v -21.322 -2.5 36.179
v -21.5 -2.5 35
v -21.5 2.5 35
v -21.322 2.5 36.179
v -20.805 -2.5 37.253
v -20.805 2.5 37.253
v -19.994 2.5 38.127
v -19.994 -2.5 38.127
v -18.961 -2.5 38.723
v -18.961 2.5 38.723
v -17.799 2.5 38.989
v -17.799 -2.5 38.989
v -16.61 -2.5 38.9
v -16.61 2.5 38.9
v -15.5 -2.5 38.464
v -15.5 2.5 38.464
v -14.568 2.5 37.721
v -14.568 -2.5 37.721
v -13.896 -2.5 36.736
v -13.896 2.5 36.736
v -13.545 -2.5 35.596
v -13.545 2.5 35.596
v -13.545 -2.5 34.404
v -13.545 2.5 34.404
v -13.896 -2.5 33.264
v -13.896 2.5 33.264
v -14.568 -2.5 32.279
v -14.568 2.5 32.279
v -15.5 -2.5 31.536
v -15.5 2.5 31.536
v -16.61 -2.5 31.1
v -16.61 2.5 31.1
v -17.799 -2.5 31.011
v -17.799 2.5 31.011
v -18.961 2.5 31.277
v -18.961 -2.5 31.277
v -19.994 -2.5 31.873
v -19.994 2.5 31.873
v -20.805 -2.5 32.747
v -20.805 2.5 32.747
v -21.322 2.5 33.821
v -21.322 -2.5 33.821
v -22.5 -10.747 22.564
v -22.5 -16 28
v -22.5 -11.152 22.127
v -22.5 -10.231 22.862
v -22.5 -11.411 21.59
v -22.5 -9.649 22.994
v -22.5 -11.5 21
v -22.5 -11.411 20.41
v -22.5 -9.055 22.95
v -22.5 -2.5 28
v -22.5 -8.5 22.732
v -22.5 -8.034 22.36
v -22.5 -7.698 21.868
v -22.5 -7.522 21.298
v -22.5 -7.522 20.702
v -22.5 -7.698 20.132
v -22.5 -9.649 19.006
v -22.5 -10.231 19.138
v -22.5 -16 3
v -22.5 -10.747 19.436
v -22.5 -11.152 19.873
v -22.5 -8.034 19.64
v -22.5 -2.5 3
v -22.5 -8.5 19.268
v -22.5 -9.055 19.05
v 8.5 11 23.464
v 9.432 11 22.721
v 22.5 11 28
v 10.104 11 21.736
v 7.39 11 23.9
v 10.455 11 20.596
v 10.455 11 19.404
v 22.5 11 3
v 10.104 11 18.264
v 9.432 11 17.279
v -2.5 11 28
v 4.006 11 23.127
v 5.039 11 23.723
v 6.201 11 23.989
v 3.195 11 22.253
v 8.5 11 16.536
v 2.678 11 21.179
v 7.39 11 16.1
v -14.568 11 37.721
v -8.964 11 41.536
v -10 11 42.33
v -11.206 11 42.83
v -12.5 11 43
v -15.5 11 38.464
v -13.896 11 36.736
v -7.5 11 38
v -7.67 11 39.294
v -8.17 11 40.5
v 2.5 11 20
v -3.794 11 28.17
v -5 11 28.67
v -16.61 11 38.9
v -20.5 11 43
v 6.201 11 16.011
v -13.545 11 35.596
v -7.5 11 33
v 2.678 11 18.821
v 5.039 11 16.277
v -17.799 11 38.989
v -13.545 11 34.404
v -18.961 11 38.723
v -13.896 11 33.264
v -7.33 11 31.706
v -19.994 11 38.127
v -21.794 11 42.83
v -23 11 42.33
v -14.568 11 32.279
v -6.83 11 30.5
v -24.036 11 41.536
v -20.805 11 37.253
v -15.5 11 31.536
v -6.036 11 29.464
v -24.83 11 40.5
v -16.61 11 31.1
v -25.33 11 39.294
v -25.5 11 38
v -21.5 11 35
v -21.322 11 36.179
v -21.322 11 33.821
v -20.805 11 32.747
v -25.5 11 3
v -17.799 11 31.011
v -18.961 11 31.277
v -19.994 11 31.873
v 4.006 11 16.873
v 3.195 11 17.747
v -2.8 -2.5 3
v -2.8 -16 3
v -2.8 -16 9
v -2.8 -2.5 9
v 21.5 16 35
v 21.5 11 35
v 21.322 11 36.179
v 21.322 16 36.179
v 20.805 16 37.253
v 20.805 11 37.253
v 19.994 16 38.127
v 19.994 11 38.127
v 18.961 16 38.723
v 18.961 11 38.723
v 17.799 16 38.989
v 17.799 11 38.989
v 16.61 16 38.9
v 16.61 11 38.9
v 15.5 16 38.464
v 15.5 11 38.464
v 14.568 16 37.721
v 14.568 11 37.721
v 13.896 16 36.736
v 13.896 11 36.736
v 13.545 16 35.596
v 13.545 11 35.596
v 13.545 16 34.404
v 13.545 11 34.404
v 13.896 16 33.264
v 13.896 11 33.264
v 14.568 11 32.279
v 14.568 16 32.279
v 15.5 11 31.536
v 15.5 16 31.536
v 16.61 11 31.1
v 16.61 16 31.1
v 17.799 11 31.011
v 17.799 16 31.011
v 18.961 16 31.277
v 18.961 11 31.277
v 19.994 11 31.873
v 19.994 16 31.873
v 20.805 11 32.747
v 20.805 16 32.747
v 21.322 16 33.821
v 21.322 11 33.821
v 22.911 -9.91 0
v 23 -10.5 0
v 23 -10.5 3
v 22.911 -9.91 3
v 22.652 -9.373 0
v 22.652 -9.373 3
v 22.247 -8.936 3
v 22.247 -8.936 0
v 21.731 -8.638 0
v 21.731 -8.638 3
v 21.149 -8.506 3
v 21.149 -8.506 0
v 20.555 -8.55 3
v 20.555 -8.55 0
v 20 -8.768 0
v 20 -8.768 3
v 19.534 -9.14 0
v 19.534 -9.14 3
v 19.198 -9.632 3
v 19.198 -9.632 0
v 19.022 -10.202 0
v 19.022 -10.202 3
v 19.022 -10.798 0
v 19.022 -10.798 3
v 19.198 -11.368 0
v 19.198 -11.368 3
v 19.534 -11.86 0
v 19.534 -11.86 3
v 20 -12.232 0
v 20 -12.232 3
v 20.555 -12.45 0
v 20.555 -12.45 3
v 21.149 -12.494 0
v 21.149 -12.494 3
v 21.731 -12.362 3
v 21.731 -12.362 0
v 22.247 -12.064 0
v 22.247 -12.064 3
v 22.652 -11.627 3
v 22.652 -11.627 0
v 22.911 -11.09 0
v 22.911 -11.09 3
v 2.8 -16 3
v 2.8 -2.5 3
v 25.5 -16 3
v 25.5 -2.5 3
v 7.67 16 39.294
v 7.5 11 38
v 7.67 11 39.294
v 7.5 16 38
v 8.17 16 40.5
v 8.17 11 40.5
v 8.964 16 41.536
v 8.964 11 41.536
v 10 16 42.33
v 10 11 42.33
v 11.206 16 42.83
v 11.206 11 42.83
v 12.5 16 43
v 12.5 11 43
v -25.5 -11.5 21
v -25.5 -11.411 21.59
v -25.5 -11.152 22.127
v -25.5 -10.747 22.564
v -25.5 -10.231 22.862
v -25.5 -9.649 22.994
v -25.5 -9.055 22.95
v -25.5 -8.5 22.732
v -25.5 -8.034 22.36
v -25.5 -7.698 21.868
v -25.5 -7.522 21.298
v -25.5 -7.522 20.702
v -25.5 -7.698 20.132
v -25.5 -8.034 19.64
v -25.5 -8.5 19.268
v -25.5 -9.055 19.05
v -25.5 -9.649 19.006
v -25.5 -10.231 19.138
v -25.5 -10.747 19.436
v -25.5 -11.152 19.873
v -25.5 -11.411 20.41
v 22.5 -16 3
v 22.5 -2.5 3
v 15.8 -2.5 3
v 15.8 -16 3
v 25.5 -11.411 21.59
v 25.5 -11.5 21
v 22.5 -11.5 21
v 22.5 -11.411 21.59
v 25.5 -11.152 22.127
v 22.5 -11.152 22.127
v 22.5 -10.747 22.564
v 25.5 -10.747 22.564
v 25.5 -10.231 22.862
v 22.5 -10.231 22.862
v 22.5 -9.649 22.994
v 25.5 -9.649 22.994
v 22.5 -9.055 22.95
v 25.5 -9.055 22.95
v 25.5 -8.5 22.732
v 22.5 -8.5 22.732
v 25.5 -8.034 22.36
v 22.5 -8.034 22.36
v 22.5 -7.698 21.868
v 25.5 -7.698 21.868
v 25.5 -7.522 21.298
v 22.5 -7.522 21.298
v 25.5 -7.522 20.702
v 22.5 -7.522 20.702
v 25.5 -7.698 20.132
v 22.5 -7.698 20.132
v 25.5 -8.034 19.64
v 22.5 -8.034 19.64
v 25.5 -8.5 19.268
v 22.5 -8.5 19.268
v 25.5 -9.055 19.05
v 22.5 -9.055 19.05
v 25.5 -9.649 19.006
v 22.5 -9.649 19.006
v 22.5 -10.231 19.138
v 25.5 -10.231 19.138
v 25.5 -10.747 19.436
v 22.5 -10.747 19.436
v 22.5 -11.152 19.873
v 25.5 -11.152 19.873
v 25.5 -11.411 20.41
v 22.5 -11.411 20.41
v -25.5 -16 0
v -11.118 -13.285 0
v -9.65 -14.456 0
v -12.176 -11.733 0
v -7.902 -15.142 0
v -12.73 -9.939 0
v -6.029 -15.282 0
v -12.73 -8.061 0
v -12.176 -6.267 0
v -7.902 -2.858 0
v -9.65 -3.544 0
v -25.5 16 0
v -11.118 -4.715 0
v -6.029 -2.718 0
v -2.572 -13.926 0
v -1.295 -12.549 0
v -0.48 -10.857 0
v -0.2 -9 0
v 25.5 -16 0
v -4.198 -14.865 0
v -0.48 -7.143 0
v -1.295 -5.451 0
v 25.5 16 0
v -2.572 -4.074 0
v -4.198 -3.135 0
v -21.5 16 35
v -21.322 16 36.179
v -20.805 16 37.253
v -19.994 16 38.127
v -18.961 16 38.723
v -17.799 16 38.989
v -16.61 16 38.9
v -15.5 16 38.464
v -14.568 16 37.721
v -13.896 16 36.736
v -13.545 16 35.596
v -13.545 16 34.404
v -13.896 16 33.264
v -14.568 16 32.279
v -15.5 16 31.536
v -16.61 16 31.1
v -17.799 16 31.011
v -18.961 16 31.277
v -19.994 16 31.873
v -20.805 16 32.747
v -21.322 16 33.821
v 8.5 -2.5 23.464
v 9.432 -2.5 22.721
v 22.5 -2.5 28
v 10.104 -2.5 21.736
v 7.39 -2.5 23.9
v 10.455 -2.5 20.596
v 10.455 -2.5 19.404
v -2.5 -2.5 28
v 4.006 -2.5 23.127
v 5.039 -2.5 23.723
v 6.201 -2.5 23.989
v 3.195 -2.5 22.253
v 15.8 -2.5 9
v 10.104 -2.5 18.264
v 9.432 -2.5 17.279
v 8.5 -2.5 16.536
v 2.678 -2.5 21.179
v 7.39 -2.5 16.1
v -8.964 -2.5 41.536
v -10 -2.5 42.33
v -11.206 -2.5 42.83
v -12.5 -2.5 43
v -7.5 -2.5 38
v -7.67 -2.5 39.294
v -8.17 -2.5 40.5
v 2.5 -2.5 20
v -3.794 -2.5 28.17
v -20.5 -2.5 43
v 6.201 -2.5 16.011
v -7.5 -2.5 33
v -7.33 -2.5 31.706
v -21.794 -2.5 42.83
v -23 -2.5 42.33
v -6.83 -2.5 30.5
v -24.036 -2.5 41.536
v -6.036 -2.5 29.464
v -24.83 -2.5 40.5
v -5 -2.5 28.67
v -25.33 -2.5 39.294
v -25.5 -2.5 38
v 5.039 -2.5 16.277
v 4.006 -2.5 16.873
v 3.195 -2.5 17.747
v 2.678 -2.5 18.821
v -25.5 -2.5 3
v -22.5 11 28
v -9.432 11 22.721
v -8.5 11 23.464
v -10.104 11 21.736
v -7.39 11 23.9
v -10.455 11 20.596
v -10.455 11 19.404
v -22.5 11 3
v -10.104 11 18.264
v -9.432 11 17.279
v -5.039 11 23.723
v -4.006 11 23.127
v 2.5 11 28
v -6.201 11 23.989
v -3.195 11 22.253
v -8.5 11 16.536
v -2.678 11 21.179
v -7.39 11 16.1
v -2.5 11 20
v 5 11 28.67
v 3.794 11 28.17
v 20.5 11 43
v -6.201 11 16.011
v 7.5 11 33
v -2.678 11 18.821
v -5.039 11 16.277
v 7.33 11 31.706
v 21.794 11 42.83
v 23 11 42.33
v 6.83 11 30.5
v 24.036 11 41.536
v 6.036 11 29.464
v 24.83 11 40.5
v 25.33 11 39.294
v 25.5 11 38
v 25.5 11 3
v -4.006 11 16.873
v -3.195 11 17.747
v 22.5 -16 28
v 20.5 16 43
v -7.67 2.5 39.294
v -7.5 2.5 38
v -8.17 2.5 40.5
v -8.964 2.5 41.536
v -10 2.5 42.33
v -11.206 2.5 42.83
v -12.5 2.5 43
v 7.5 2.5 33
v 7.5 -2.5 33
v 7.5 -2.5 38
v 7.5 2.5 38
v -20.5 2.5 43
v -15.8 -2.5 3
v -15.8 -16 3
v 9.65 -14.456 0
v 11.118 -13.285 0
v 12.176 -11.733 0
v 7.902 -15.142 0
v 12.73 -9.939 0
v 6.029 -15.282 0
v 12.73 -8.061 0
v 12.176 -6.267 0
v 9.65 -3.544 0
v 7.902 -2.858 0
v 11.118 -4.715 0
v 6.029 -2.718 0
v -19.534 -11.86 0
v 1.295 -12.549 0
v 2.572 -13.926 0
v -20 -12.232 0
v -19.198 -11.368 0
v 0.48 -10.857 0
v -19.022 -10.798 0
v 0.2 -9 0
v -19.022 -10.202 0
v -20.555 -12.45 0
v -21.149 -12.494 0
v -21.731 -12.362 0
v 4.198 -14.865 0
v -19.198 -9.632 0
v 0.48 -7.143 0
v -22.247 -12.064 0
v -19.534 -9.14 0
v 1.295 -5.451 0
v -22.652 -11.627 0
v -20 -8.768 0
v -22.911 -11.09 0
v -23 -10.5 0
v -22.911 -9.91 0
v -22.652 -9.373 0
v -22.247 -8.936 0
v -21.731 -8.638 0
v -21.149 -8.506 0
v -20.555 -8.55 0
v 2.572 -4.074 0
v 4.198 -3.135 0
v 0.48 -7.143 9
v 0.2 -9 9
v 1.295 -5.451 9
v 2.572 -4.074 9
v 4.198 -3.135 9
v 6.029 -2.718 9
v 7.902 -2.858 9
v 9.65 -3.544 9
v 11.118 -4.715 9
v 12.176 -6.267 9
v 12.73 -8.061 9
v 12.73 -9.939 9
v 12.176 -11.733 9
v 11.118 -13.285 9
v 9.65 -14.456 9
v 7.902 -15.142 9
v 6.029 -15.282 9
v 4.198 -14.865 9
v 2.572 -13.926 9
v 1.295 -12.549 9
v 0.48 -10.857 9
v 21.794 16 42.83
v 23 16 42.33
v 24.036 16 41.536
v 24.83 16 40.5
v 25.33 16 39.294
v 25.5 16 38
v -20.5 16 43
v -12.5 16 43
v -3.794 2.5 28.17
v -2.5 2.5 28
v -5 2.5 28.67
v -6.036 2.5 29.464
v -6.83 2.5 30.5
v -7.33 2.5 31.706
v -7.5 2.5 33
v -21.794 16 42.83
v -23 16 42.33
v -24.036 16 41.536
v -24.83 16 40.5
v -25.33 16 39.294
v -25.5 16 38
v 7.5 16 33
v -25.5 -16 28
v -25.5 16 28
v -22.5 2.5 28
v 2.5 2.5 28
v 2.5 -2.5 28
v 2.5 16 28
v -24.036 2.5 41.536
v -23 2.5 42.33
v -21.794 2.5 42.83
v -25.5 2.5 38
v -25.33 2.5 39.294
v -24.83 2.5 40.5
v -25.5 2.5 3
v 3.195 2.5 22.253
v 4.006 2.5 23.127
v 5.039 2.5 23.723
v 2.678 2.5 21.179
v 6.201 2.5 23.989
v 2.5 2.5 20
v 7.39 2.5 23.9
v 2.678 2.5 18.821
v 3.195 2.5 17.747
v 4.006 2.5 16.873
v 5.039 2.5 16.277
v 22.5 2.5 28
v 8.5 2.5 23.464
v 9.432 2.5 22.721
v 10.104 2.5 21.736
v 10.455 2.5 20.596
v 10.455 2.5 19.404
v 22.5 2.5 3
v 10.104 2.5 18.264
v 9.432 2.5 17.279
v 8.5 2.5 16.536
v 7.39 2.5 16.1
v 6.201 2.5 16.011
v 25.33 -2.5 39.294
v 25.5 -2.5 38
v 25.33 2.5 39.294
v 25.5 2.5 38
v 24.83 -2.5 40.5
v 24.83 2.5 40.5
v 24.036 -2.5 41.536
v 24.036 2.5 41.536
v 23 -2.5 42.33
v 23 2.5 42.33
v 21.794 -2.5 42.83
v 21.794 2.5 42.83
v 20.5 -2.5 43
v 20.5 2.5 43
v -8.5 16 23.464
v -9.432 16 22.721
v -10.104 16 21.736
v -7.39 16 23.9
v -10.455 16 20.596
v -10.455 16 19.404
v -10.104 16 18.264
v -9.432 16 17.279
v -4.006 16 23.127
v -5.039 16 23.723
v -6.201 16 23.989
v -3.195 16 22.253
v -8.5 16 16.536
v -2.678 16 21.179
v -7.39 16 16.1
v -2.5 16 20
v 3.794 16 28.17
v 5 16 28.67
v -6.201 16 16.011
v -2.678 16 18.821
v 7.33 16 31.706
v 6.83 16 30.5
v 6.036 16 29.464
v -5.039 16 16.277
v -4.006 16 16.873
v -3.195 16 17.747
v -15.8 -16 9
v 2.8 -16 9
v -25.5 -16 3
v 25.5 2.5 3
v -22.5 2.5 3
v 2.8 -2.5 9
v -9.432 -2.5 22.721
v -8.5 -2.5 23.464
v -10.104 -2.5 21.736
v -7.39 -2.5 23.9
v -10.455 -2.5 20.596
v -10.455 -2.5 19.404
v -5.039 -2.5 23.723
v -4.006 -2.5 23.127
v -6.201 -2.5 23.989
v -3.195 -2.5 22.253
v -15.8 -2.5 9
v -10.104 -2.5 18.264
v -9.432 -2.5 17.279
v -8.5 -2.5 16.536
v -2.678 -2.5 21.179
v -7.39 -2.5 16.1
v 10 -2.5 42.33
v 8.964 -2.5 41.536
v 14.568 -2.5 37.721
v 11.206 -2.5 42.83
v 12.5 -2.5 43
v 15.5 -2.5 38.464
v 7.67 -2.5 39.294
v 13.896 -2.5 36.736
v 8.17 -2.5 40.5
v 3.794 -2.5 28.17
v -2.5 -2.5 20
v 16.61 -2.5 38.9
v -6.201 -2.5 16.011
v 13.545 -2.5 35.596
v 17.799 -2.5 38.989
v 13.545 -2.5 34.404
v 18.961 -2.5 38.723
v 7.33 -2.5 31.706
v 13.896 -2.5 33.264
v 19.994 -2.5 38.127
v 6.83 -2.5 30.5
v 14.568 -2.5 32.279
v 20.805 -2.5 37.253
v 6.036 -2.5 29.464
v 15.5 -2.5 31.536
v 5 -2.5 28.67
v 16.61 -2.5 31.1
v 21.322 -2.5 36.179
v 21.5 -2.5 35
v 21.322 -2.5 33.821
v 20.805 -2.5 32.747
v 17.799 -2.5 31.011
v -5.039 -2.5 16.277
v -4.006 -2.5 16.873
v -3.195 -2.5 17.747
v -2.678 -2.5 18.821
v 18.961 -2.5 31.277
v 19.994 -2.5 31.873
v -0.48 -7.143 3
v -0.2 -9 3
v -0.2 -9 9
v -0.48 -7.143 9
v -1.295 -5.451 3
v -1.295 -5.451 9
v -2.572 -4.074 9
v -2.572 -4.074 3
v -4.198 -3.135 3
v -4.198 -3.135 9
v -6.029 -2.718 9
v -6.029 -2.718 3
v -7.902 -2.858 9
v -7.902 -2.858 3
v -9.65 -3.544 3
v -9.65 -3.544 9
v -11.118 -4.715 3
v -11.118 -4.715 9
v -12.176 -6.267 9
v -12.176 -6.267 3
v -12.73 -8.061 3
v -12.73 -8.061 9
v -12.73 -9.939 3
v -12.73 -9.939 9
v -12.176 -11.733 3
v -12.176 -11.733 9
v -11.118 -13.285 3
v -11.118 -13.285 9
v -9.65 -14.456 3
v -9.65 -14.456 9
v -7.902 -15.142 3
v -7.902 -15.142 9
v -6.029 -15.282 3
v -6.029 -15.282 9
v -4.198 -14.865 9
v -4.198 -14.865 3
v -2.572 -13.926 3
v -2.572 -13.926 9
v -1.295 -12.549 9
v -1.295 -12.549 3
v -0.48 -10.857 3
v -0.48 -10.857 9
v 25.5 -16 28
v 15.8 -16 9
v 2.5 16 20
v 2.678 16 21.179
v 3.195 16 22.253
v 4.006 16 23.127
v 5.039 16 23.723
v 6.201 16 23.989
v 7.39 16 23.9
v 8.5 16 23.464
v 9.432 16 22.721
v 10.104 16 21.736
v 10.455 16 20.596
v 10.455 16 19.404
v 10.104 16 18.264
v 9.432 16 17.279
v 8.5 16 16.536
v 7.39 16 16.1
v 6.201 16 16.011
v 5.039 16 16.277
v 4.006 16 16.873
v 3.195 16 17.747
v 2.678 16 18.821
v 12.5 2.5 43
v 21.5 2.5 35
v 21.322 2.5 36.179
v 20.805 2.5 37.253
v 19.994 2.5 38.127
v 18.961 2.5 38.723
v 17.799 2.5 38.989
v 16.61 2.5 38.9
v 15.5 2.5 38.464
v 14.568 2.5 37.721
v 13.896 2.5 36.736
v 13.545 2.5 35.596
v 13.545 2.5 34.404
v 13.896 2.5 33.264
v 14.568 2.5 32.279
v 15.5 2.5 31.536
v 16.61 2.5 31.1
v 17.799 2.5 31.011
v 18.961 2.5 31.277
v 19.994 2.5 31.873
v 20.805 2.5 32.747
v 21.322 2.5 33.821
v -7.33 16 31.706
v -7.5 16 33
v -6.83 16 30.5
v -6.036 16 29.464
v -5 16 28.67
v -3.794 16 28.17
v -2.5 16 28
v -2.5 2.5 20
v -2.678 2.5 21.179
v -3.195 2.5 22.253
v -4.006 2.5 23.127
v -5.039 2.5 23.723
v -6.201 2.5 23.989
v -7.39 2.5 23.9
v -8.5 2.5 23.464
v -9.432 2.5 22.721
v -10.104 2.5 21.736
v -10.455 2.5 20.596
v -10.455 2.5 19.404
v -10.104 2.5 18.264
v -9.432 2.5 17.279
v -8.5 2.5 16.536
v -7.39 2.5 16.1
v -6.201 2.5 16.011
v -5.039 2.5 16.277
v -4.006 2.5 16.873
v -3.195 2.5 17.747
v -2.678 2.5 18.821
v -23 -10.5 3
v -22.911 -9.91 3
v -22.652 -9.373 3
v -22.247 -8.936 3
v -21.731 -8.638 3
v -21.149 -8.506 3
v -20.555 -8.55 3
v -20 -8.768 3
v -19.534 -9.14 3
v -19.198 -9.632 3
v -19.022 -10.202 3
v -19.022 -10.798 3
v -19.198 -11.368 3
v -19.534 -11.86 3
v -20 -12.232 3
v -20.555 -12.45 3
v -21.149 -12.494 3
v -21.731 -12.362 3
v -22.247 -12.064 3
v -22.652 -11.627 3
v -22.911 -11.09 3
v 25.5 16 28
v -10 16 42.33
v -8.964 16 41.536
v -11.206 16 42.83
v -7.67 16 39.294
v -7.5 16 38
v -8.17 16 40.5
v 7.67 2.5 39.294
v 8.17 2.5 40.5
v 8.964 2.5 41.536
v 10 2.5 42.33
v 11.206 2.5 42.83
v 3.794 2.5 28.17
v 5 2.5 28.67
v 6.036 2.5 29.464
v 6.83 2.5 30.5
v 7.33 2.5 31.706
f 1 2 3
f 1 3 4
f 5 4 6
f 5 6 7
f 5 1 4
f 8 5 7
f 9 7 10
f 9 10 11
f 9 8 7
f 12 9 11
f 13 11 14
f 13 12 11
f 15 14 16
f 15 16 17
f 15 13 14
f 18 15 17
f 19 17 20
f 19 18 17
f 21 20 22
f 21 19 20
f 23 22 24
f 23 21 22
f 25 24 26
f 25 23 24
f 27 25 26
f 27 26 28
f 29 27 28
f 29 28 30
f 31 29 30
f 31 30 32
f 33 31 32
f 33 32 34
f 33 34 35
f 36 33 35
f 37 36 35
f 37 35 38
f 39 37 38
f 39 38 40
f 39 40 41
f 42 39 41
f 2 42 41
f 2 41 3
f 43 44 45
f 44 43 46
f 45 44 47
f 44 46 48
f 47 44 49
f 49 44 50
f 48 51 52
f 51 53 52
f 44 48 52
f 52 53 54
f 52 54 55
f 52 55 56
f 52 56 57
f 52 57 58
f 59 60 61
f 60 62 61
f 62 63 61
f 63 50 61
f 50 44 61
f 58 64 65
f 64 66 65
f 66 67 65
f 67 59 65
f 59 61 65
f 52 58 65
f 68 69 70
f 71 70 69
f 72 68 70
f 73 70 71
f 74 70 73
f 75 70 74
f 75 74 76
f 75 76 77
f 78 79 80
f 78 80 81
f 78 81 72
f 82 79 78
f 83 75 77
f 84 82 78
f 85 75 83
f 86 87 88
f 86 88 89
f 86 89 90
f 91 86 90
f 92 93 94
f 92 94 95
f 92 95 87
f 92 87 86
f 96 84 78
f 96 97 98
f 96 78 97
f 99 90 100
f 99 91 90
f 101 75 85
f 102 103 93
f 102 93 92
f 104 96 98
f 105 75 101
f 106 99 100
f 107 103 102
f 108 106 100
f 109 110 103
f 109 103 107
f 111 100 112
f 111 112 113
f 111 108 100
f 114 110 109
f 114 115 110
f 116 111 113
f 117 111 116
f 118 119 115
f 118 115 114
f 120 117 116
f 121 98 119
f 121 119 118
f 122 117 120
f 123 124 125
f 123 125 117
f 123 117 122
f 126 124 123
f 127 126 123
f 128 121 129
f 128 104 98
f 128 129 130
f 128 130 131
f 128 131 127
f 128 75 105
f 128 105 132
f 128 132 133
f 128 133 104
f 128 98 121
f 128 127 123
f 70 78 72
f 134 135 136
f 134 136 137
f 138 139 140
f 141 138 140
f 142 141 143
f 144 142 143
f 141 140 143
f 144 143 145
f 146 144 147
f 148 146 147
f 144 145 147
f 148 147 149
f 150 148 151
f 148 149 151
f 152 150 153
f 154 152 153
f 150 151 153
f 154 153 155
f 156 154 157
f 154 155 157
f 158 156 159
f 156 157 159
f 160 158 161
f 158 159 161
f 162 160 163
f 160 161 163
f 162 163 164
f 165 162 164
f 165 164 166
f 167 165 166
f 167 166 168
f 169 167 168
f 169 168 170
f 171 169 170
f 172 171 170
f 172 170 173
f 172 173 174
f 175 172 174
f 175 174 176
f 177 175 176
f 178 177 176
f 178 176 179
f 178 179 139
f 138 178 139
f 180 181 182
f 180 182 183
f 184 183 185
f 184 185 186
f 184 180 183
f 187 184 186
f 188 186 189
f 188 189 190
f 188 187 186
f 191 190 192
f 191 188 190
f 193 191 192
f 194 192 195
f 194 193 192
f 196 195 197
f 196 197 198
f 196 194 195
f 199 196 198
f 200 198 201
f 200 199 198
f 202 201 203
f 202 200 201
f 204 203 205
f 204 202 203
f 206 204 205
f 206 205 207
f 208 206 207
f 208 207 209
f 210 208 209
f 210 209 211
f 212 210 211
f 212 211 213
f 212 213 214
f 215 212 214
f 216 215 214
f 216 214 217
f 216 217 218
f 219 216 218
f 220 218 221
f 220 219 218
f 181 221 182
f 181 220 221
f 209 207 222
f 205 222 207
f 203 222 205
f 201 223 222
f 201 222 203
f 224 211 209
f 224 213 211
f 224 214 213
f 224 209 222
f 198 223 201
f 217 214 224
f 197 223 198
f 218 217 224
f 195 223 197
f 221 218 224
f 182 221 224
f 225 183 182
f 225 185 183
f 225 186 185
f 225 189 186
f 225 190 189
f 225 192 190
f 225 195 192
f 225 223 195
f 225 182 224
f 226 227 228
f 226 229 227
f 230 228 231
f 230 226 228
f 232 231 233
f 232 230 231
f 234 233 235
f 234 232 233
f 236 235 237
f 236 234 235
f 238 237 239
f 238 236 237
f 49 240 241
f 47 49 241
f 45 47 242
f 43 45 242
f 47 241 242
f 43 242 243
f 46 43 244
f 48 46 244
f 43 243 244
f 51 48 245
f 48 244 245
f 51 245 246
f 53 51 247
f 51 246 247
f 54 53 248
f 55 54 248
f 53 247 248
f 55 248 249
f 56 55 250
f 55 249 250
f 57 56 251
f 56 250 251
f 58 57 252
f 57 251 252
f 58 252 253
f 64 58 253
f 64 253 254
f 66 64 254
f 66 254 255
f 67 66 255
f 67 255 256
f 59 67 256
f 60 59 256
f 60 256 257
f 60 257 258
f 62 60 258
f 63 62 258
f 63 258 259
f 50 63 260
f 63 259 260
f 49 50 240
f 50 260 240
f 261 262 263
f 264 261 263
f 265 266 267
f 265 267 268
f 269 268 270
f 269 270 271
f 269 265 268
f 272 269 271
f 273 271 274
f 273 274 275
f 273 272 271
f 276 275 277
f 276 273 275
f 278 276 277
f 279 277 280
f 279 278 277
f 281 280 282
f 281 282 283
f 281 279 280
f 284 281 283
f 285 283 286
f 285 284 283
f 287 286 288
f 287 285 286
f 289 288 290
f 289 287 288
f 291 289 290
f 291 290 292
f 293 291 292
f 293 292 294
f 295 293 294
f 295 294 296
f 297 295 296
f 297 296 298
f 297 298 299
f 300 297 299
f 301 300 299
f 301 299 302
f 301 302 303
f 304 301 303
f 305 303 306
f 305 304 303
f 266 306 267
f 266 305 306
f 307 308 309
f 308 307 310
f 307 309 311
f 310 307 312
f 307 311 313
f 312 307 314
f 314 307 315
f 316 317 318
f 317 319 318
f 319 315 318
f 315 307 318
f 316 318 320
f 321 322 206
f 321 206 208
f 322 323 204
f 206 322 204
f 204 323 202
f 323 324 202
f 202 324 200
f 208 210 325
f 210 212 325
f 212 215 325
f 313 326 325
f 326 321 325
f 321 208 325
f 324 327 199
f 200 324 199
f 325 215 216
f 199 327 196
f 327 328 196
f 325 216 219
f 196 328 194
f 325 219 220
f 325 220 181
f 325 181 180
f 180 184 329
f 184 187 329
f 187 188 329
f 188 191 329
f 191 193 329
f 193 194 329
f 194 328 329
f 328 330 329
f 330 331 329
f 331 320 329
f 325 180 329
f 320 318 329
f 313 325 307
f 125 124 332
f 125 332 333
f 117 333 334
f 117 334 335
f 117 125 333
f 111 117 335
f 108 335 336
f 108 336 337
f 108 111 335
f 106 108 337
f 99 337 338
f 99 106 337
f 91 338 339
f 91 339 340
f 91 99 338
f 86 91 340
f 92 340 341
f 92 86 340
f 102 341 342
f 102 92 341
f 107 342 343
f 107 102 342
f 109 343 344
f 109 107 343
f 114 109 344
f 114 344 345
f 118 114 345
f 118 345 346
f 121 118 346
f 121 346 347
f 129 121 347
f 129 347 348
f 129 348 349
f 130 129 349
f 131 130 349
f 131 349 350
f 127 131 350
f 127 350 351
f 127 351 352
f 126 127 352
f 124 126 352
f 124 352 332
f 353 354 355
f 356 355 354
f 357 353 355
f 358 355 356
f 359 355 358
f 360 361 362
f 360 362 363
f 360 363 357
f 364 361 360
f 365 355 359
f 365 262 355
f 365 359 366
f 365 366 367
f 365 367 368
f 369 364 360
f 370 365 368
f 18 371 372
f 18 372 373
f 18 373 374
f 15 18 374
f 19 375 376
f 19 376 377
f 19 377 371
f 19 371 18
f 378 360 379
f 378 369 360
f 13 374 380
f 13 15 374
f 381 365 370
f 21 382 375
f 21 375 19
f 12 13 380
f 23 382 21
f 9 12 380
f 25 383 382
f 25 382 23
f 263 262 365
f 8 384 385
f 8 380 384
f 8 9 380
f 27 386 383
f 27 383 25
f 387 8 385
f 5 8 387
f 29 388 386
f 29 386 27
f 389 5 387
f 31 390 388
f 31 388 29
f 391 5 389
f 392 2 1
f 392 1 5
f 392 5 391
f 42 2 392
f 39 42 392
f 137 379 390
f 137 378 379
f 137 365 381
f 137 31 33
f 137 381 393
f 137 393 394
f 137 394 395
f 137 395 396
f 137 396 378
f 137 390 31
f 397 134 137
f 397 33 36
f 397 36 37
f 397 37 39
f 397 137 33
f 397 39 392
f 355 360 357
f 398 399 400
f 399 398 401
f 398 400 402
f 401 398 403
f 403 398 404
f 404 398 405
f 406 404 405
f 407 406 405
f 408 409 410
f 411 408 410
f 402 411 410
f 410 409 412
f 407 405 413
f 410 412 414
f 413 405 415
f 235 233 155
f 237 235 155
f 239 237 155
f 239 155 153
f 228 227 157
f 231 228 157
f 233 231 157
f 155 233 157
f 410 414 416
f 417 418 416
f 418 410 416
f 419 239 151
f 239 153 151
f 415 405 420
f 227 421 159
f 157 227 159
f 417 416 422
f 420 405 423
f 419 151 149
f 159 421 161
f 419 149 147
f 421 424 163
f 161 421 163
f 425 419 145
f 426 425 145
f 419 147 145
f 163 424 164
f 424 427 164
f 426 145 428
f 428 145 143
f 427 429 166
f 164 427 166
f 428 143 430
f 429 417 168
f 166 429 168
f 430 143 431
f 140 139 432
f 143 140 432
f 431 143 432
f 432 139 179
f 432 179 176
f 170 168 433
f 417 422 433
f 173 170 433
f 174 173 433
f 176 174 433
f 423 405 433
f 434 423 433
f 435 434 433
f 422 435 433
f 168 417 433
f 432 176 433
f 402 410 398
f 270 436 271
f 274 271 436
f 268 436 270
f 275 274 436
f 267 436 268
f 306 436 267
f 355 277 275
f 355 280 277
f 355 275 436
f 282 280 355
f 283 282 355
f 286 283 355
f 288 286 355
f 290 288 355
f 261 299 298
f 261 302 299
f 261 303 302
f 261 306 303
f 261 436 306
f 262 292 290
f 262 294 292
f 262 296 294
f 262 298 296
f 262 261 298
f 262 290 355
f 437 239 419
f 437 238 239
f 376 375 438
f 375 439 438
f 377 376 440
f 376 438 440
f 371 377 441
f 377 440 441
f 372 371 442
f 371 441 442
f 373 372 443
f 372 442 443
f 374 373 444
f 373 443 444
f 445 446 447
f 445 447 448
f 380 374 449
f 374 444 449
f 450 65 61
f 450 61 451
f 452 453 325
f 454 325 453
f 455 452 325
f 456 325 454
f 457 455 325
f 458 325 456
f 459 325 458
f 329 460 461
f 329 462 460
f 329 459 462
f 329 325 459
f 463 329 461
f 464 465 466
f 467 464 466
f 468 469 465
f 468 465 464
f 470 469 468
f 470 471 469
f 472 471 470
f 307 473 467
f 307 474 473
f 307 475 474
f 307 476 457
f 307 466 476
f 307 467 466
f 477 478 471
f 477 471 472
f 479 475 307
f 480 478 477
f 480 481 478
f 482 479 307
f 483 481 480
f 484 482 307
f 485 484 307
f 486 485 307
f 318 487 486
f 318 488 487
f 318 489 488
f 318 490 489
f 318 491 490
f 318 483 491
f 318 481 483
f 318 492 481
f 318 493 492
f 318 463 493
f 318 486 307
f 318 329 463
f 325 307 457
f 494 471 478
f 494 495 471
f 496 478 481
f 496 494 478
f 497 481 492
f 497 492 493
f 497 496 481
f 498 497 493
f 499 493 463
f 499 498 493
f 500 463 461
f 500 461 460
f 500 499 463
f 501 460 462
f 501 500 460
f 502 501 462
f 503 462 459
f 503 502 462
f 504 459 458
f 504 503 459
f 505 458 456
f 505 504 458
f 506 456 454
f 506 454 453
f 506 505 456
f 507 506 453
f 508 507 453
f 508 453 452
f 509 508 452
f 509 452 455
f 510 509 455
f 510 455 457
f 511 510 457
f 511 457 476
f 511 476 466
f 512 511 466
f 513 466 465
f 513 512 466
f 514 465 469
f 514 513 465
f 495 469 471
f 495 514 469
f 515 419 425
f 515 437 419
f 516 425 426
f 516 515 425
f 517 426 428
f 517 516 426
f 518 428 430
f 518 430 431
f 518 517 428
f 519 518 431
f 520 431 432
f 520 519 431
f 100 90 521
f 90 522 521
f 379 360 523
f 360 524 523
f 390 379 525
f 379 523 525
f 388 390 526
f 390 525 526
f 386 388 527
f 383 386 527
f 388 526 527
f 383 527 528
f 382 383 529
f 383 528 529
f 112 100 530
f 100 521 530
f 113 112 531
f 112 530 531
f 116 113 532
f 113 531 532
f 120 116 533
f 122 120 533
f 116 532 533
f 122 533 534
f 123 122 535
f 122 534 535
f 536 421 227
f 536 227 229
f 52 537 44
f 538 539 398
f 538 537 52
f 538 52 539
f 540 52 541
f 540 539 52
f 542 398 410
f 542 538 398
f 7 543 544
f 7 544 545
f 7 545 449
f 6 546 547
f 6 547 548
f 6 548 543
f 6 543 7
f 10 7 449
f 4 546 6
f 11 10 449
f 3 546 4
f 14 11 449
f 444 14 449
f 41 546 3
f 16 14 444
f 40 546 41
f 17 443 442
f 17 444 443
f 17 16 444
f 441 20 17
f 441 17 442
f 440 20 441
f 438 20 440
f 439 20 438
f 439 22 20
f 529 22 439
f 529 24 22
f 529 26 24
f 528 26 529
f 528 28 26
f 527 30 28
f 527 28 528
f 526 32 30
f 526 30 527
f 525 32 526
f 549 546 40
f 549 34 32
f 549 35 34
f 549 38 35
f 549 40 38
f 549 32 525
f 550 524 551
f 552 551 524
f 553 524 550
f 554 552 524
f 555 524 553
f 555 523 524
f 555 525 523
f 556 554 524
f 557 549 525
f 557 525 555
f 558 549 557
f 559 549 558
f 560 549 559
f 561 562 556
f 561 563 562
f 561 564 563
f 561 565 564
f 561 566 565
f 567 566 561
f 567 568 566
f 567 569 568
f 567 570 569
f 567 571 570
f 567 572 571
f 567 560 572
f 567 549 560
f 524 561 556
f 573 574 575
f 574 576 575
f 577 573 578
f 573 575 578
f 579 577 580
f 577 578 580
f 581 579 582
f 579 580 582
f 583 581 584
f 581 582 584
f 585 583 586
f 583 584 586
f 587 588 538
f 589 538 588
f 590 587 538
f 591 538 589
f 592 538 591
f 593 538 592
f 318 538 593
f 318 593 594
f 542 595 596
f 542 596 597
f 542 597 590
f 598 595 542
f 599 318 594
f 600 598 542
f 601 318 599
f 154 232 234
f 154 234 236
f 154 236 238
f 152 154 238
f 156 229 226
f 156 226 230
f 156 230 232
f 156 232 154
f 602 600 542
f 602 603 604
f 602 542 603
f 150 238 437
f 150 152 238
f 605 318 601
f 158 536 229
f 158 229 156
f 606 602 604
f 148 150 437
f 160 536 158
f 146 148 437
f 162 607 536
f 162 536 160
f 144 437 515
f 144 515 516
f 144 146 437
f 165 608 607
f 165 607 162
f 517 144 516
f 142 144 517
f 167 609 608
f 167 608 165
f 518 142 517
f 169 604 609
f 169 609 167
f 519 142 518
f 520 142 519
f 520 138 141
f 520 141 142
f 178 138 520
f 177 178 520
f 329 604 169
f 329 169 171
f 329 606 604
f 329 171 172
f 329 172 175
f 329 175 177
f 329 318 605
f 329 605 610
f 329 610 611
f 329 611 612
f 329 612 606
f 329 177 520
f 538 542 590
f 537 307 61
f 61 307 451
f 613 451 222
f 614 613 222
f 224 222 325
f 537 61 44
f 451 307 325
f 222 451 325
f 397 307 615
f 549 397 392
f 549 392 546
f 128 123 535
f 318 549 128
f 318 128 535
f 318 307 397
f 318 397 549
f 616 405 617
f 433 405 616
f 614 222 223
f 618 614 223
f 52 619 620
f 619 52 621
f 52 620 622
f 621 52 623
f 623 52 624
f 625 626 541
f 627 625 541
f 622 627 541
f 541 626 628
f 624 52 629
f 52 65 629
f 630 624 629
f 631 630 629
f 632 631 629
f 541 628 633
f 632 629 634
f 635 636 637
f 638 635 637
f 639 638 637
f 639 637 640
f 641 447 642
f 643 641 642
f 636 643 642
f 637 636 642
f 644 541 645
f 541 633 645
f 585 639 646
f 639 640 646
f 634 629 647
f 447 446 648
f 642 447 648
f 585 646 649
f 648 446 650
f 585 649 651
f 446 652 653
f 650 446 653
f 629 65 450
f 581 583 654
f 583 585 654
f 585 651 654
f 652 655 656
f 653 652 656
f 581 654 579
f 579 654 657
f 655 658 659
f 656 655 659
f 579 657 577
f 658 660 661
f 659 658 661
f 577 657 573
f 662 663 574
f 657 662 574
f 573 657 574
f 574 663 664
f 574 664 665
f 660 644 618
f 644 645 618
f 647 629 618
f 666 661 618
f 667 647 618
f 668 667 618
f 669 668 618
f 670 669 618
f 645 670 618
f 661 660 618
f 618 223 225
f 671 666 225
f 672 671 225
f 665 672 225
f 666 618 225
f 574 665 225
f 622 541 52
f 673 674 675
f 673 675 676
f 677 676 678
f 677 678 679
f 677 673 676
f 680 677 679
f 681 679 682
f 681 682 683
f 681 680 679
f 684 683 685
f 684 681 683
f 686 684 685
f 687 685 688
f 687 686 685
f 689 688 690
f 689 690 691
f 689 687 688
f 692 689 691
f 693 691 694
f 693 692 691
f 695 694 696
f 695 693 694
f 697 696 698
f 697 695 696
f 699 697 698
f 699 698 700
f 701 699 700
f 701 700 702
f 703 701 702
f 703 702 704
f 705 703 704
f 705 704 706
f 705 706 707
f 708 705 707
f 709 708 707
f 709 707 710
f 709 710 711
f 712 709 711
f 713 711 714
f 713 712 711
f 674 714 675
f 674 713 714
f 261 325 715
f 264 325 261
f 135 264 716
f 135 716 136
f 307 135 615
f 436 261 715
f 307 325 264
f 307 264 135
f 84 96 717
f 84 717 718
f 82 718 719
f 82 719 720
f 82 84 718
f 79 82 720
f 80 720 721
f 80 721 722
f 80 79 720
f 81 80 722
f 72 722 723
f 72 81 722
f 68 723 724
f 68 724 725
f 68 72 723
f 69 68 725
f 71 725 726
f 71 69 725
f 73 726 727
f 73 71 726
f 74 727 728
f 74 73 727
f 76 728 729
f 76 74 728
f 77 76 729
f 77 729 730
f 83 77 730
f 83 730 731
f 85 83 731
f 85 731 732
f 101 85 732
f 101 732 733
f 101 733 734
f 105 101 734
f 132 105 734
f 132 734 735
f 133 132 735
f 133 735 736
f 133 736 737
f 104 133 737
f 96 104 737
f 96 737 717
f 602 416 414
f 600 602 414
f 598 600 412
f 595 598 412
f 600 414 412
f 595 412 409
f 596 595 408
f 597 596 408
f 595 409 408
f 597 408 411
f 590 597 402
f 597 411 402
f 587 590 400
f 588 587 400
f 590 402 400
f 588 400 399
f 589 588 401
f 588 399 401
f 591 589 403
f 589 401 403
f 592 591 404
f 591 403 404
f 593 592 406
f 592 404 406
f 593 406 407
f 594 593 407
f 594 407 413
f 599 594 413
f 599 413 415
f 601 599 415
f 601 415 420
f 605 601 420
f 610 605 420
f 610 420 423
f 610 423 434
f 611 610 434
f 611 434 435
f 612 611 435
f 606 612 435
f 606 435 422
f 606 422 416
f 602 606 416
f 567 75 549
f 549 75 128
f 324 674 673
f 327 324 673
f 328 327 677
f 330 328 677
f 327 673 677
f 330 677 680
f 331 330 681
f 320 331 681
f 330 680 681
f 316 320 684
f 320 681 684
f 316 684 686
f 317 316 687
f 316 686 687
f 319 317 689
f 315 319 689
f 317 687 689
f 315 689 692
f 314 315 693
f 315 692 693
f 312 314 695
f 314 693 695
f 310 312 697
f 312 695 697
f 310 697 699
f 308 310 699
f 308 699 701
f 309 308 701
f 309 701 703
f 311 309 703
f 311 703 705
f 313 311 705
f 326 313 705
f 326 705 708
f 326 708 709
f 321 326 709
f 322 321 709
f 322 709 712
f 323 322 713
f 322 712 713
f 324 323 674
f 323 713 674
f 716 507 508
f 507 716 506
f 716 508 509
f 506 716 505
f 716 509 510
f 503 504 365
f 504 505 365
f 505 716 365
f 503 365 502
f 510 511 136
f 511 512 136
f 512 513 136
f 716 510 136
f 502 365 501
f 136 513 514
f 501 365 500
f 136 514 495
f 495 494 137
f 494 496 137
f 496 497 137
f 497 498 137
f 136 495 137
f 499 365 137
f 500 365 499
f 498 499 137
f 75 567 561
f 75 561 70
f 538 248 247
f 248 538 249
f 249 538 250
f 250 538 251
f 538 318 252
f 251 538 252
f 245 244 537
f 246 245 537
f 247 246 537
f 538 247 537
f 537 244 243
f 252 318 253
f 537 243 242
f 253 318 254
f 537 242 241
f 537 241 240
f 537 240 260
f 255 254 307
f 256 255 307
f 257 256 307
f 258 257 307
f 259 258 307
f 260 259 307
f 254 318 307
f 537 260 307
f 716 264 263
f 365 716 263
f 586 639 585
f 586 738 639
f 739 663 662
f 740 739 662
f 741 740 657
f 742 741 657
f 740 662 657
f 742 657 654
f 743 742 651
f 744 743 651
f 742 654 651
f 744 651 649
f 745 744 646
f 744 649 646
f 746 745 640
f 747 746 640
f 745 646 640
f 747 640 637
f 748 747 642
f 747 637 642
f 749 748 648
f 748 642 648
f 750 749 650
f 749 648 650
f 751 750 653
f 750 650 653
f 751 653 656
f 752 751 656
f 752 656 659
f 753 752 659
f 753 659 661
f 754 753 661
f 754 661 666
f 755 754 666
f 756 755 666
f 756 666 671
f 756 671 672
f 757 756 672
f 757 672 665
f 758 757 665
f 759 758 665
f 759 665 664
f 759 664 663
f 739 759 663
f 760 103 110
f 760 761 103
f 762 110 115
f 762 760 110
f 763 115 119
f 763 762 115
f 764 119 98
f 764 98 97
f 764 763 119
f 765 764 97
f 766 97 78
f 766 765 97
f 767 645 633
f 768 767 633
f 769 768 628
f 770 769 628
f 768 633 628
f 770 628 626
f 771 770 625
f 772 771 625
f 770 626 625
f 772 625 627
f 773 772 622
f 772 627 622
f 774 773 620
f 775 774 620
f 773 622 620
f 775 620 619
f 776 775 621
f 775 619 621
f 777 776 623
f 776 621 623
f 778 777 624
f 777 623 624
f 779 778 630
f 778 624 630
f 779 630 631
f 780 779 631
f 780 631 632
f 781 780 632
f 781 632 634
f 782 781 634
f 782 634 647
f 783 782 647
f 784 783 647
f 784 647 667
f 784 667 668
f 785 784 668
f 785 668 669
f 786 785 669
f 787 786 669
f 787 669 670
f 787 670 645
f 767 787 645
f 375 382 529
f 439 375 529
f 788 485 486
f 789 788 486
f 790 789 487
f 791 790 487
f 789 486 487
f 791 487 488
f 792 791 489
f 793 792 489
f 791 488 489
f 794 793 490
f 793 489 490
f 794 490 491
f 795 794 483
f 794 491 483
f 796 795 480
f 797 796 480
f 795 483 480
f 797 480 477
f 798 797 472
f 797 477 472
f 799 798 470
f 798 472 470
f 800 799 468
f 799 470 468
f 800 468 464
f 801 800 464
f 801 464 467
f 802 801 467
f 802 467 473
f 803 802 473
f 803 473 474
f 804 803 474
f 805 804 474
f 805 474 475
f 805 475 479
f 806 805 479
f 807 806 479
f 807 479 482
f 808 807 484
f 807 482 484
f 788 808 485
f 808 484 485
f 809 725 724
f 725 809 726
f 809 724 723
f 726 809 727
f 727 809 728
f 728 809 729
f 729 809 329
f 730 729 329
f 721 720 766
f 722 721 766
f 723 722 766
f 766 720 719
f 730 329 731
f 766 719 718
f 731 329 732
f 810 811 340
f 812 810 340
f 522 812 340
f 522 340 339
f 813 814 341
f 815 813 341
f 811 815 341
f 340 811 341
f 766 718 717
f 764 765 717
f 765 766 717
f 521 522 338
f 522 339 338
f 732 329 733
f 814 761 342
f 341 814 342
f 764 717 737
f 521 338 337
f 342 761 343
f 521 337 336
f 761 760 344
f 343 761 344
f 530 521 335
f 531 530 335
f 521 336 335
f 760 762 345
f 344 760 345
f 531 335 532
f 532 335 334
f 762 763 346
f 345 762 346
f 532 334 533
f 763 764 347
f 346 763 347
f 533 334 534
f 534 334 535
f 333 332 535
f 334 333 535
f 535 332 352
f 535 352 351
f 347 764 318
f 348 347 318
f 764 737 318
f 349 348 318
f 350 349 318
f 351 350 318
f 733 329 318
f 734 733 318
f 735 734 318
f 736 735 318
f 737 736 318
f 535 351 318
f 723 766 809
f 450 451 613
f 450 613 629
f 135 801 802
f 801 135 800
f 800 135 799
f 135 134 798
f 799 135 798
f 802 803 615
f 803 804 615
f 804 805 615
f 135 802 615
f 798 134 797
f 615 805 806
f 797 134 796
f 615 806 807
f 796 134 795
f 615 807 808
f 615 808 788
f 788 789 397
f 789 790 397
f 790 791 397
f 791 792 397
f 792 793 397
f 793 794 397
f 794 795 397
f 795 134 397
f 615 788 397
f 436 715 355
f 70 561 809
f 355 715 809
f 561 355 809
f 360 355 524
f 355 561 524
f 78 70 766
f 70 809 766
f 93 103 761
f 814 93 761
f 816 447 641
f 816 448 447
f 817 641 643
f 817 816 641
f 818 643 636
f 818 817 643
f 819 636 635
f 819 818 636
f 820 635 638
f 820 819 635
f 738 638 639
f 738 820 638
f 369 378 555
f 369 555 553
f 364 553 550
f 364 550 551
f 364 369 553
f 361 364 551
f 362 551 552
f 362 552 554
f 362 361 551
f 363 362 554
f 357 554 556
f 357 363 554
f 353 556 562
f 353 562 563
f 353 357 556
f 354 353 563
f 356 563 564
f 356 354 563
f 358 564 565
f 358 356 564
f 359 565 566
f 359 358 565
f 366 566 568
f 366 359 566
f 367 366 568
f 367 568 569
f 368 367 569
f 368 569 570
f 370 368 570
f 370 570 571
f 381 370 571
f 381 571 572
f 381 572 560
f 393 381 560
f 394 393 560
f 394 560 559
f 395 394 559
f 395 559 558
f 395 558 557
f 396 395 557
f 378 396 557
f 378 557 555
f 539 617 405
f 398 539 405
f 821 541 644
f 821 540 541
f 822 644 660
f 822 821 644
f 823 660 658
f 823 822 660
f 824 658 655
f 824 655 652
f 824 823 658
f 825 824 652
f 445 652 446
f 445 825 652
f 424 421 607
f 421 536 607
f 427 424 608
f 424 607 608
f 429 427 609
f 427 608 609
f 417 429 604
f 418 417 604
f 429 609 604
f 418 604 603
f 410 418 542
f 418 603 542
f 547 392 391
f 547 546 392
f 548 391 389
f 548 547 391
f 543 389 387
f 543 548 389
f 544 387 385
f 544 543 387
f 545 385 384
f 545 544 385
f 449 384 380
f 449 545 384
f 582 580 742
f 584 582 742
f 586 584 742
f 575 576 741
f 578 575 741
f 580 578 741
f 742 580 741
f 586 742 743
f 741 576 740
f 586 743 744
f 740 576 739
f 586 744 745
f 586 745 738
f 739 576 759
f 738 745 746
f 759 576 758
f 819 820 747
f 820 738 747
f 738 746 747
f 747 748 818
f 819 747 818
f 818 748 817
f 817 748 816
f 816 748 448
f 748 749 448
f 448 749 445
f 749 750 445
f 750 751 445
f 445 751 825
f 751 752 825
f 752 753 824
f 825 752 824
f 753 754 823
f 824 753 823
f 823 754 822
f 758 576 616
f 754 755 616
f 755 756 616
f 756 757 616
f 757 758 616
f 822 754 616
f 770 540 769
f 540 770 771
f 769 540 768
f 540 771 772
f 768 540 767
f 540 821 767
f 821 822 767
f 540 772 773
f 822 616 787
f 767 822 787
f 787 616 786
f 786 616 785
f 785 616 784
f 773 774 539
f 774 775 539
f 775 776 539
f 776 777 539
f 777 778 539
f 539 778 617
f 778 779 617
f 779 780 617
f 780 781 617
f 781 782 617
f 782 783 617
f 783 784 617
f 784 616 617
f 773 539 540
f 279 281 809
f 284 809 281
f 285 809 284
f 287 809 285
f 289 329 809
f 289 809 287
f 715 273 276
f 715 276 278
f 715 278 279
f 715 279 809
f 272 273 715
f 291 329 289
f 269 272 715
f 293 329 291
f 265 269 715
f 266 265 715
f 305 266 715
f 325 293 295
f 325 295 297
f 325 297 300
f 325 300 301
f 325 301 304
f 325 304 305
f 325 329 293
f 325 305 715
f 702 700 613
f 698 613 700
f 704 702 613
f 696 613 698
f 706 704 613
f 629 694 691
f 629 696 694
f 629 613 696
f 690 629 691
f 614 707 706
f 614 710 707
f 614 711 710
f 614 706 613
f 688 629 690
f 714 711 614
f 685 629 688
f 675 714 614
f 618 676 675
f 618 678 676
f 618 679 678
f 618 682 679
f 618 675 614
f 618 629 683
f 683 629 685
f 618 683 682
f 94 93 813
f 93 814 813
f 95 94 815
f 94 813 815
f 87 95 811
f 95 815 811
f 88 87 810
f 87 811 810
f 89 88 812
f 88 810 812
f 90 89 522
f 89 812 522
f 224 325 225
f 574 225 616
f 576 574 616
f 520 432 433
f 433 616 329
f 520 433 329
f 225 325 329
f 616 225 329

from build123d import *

# Parameters (mm, degrees)
F0_W      = 51
F0_H      = 32
F0_R      = 2
F1_DEPTH  = 3
F3_DEPTH  = 25
F2_W      = 18.6
F2_H      = 13.5
F2_R      = 6.3
F4_DEPTH  = 6
F5_DEPTH  = 3
F6_W      = 18
F6_H      = 5
F7_DEPTH  = 15
F8_R      = 4
F9_DEPTH  = 18.501
F10_DEPTH = 18.501
F11_R     = 5
F12_R     = 2
F13_DEPTH = 3


with BuildPart() as f1:
    # F0 (on Top) → F1 (new body)
    with BuildSketch(Plane.XY):
        Rectangle(F0_W, F0_H)
        with Locations((21, -10.5)):
            Circle(F0_R, mode=Mode.SUBTRACT)
    extrude(amount=F1_DEPTH)

    # F2 (on face) → F3 (join)
    with BuildSketch(Plane.XY.offset(3)):
        Polygon((-22.5, 2.5), (-22.5, 11), (25.5, 11), (25.5, 16), (-25.5, 16), (-25.5, -16), (-22.5, -16), (-22.5, -2.5), (-15.8, -2.5), (2.8, -2.5), (25.5, -2.5), (25.5, 2.5), align=None)
    extrude(amount=F3_DEPTH)

    # F2 (on face) → F4 (join)
    with BuildSketch(Plane.XY.offset(3)):
        with Locations((-6.5, -9.25)):
            Rectangle(F2_W, F2_H)
        with Locations((-6.5, -9)):
            Circle(F2_R, mode=Mode.SUBTRACT)
    extrude(amount=F4_DEPTH)

    # F5 (cut, through all): a face of the model
    f5_faces = [f1.faces().sort_by_distance(p)[0] for p in [
        (-6.5, -9, 3),
    ]]
    extrude(f5_faces, amount=-F5_DEPTH, mode=Mode.SUBTRACT)

    # F6 (on face) → F7 (join)
    with BuildSketch(Plane.XY.offset(28)):
        with Locations((16.5, 13.5)):
            Rectangle(F6_W, F6_H)
        with Locations((16.5, 0)):
            Rectangle(F6_W, F6_H)
    extrude(amount=F7_DEPTH)

    # F8 (on face) → F9 (cut, through all)
    with BuildSketch(Plane.XZ.offset(2.5)):
        with Locations((-6.5, 20)):
            Circle(F8_R)
    extrude(amount=-F9_DEPTH, mode=Mode.SUBTRACT)

    # F8 (on face) → F10 (cut, through all)
    with BuildSketch(Plane.XZ.offset(2.5)):
        with Locations((17.5, 35)):
            Circle(F8_R)
    extrude(amount=-F10_DEPTH, mode=Mode.SUBTRACT)

    # F11
    f11_edges = [f1.edges().sort_by_distance(p)[0] for p in [
        (25.5, 0, 43),
        (25.5, 13.5, 43),
        (7.5, 13.5, 43),
        (7.5, 0, 43),
        (7.5, 13.5, 28),
        (7.5, 0, 28),
    ]]
    fillet(f11_edges, radius=F11_R)

    # F12 (on face) → F13 (cut, through all)
    with BuildSketch(Plane(origin=(-25.5, 0, 0), x_dir=(0, -1, 0), z_dir=(-1, 0, 0))):
        with Locations((9.5, 21)):
            Circle(F12_R)
    extrude(amount=-F13_DEPTH, mode=Mode.SUBTRACT)


with BuildPart() as f14_1:
    # F14: instance of F1
    add(f1.part.mirror(Plane.YZ))


solid = Compound([f1.part, f14_1.part])
